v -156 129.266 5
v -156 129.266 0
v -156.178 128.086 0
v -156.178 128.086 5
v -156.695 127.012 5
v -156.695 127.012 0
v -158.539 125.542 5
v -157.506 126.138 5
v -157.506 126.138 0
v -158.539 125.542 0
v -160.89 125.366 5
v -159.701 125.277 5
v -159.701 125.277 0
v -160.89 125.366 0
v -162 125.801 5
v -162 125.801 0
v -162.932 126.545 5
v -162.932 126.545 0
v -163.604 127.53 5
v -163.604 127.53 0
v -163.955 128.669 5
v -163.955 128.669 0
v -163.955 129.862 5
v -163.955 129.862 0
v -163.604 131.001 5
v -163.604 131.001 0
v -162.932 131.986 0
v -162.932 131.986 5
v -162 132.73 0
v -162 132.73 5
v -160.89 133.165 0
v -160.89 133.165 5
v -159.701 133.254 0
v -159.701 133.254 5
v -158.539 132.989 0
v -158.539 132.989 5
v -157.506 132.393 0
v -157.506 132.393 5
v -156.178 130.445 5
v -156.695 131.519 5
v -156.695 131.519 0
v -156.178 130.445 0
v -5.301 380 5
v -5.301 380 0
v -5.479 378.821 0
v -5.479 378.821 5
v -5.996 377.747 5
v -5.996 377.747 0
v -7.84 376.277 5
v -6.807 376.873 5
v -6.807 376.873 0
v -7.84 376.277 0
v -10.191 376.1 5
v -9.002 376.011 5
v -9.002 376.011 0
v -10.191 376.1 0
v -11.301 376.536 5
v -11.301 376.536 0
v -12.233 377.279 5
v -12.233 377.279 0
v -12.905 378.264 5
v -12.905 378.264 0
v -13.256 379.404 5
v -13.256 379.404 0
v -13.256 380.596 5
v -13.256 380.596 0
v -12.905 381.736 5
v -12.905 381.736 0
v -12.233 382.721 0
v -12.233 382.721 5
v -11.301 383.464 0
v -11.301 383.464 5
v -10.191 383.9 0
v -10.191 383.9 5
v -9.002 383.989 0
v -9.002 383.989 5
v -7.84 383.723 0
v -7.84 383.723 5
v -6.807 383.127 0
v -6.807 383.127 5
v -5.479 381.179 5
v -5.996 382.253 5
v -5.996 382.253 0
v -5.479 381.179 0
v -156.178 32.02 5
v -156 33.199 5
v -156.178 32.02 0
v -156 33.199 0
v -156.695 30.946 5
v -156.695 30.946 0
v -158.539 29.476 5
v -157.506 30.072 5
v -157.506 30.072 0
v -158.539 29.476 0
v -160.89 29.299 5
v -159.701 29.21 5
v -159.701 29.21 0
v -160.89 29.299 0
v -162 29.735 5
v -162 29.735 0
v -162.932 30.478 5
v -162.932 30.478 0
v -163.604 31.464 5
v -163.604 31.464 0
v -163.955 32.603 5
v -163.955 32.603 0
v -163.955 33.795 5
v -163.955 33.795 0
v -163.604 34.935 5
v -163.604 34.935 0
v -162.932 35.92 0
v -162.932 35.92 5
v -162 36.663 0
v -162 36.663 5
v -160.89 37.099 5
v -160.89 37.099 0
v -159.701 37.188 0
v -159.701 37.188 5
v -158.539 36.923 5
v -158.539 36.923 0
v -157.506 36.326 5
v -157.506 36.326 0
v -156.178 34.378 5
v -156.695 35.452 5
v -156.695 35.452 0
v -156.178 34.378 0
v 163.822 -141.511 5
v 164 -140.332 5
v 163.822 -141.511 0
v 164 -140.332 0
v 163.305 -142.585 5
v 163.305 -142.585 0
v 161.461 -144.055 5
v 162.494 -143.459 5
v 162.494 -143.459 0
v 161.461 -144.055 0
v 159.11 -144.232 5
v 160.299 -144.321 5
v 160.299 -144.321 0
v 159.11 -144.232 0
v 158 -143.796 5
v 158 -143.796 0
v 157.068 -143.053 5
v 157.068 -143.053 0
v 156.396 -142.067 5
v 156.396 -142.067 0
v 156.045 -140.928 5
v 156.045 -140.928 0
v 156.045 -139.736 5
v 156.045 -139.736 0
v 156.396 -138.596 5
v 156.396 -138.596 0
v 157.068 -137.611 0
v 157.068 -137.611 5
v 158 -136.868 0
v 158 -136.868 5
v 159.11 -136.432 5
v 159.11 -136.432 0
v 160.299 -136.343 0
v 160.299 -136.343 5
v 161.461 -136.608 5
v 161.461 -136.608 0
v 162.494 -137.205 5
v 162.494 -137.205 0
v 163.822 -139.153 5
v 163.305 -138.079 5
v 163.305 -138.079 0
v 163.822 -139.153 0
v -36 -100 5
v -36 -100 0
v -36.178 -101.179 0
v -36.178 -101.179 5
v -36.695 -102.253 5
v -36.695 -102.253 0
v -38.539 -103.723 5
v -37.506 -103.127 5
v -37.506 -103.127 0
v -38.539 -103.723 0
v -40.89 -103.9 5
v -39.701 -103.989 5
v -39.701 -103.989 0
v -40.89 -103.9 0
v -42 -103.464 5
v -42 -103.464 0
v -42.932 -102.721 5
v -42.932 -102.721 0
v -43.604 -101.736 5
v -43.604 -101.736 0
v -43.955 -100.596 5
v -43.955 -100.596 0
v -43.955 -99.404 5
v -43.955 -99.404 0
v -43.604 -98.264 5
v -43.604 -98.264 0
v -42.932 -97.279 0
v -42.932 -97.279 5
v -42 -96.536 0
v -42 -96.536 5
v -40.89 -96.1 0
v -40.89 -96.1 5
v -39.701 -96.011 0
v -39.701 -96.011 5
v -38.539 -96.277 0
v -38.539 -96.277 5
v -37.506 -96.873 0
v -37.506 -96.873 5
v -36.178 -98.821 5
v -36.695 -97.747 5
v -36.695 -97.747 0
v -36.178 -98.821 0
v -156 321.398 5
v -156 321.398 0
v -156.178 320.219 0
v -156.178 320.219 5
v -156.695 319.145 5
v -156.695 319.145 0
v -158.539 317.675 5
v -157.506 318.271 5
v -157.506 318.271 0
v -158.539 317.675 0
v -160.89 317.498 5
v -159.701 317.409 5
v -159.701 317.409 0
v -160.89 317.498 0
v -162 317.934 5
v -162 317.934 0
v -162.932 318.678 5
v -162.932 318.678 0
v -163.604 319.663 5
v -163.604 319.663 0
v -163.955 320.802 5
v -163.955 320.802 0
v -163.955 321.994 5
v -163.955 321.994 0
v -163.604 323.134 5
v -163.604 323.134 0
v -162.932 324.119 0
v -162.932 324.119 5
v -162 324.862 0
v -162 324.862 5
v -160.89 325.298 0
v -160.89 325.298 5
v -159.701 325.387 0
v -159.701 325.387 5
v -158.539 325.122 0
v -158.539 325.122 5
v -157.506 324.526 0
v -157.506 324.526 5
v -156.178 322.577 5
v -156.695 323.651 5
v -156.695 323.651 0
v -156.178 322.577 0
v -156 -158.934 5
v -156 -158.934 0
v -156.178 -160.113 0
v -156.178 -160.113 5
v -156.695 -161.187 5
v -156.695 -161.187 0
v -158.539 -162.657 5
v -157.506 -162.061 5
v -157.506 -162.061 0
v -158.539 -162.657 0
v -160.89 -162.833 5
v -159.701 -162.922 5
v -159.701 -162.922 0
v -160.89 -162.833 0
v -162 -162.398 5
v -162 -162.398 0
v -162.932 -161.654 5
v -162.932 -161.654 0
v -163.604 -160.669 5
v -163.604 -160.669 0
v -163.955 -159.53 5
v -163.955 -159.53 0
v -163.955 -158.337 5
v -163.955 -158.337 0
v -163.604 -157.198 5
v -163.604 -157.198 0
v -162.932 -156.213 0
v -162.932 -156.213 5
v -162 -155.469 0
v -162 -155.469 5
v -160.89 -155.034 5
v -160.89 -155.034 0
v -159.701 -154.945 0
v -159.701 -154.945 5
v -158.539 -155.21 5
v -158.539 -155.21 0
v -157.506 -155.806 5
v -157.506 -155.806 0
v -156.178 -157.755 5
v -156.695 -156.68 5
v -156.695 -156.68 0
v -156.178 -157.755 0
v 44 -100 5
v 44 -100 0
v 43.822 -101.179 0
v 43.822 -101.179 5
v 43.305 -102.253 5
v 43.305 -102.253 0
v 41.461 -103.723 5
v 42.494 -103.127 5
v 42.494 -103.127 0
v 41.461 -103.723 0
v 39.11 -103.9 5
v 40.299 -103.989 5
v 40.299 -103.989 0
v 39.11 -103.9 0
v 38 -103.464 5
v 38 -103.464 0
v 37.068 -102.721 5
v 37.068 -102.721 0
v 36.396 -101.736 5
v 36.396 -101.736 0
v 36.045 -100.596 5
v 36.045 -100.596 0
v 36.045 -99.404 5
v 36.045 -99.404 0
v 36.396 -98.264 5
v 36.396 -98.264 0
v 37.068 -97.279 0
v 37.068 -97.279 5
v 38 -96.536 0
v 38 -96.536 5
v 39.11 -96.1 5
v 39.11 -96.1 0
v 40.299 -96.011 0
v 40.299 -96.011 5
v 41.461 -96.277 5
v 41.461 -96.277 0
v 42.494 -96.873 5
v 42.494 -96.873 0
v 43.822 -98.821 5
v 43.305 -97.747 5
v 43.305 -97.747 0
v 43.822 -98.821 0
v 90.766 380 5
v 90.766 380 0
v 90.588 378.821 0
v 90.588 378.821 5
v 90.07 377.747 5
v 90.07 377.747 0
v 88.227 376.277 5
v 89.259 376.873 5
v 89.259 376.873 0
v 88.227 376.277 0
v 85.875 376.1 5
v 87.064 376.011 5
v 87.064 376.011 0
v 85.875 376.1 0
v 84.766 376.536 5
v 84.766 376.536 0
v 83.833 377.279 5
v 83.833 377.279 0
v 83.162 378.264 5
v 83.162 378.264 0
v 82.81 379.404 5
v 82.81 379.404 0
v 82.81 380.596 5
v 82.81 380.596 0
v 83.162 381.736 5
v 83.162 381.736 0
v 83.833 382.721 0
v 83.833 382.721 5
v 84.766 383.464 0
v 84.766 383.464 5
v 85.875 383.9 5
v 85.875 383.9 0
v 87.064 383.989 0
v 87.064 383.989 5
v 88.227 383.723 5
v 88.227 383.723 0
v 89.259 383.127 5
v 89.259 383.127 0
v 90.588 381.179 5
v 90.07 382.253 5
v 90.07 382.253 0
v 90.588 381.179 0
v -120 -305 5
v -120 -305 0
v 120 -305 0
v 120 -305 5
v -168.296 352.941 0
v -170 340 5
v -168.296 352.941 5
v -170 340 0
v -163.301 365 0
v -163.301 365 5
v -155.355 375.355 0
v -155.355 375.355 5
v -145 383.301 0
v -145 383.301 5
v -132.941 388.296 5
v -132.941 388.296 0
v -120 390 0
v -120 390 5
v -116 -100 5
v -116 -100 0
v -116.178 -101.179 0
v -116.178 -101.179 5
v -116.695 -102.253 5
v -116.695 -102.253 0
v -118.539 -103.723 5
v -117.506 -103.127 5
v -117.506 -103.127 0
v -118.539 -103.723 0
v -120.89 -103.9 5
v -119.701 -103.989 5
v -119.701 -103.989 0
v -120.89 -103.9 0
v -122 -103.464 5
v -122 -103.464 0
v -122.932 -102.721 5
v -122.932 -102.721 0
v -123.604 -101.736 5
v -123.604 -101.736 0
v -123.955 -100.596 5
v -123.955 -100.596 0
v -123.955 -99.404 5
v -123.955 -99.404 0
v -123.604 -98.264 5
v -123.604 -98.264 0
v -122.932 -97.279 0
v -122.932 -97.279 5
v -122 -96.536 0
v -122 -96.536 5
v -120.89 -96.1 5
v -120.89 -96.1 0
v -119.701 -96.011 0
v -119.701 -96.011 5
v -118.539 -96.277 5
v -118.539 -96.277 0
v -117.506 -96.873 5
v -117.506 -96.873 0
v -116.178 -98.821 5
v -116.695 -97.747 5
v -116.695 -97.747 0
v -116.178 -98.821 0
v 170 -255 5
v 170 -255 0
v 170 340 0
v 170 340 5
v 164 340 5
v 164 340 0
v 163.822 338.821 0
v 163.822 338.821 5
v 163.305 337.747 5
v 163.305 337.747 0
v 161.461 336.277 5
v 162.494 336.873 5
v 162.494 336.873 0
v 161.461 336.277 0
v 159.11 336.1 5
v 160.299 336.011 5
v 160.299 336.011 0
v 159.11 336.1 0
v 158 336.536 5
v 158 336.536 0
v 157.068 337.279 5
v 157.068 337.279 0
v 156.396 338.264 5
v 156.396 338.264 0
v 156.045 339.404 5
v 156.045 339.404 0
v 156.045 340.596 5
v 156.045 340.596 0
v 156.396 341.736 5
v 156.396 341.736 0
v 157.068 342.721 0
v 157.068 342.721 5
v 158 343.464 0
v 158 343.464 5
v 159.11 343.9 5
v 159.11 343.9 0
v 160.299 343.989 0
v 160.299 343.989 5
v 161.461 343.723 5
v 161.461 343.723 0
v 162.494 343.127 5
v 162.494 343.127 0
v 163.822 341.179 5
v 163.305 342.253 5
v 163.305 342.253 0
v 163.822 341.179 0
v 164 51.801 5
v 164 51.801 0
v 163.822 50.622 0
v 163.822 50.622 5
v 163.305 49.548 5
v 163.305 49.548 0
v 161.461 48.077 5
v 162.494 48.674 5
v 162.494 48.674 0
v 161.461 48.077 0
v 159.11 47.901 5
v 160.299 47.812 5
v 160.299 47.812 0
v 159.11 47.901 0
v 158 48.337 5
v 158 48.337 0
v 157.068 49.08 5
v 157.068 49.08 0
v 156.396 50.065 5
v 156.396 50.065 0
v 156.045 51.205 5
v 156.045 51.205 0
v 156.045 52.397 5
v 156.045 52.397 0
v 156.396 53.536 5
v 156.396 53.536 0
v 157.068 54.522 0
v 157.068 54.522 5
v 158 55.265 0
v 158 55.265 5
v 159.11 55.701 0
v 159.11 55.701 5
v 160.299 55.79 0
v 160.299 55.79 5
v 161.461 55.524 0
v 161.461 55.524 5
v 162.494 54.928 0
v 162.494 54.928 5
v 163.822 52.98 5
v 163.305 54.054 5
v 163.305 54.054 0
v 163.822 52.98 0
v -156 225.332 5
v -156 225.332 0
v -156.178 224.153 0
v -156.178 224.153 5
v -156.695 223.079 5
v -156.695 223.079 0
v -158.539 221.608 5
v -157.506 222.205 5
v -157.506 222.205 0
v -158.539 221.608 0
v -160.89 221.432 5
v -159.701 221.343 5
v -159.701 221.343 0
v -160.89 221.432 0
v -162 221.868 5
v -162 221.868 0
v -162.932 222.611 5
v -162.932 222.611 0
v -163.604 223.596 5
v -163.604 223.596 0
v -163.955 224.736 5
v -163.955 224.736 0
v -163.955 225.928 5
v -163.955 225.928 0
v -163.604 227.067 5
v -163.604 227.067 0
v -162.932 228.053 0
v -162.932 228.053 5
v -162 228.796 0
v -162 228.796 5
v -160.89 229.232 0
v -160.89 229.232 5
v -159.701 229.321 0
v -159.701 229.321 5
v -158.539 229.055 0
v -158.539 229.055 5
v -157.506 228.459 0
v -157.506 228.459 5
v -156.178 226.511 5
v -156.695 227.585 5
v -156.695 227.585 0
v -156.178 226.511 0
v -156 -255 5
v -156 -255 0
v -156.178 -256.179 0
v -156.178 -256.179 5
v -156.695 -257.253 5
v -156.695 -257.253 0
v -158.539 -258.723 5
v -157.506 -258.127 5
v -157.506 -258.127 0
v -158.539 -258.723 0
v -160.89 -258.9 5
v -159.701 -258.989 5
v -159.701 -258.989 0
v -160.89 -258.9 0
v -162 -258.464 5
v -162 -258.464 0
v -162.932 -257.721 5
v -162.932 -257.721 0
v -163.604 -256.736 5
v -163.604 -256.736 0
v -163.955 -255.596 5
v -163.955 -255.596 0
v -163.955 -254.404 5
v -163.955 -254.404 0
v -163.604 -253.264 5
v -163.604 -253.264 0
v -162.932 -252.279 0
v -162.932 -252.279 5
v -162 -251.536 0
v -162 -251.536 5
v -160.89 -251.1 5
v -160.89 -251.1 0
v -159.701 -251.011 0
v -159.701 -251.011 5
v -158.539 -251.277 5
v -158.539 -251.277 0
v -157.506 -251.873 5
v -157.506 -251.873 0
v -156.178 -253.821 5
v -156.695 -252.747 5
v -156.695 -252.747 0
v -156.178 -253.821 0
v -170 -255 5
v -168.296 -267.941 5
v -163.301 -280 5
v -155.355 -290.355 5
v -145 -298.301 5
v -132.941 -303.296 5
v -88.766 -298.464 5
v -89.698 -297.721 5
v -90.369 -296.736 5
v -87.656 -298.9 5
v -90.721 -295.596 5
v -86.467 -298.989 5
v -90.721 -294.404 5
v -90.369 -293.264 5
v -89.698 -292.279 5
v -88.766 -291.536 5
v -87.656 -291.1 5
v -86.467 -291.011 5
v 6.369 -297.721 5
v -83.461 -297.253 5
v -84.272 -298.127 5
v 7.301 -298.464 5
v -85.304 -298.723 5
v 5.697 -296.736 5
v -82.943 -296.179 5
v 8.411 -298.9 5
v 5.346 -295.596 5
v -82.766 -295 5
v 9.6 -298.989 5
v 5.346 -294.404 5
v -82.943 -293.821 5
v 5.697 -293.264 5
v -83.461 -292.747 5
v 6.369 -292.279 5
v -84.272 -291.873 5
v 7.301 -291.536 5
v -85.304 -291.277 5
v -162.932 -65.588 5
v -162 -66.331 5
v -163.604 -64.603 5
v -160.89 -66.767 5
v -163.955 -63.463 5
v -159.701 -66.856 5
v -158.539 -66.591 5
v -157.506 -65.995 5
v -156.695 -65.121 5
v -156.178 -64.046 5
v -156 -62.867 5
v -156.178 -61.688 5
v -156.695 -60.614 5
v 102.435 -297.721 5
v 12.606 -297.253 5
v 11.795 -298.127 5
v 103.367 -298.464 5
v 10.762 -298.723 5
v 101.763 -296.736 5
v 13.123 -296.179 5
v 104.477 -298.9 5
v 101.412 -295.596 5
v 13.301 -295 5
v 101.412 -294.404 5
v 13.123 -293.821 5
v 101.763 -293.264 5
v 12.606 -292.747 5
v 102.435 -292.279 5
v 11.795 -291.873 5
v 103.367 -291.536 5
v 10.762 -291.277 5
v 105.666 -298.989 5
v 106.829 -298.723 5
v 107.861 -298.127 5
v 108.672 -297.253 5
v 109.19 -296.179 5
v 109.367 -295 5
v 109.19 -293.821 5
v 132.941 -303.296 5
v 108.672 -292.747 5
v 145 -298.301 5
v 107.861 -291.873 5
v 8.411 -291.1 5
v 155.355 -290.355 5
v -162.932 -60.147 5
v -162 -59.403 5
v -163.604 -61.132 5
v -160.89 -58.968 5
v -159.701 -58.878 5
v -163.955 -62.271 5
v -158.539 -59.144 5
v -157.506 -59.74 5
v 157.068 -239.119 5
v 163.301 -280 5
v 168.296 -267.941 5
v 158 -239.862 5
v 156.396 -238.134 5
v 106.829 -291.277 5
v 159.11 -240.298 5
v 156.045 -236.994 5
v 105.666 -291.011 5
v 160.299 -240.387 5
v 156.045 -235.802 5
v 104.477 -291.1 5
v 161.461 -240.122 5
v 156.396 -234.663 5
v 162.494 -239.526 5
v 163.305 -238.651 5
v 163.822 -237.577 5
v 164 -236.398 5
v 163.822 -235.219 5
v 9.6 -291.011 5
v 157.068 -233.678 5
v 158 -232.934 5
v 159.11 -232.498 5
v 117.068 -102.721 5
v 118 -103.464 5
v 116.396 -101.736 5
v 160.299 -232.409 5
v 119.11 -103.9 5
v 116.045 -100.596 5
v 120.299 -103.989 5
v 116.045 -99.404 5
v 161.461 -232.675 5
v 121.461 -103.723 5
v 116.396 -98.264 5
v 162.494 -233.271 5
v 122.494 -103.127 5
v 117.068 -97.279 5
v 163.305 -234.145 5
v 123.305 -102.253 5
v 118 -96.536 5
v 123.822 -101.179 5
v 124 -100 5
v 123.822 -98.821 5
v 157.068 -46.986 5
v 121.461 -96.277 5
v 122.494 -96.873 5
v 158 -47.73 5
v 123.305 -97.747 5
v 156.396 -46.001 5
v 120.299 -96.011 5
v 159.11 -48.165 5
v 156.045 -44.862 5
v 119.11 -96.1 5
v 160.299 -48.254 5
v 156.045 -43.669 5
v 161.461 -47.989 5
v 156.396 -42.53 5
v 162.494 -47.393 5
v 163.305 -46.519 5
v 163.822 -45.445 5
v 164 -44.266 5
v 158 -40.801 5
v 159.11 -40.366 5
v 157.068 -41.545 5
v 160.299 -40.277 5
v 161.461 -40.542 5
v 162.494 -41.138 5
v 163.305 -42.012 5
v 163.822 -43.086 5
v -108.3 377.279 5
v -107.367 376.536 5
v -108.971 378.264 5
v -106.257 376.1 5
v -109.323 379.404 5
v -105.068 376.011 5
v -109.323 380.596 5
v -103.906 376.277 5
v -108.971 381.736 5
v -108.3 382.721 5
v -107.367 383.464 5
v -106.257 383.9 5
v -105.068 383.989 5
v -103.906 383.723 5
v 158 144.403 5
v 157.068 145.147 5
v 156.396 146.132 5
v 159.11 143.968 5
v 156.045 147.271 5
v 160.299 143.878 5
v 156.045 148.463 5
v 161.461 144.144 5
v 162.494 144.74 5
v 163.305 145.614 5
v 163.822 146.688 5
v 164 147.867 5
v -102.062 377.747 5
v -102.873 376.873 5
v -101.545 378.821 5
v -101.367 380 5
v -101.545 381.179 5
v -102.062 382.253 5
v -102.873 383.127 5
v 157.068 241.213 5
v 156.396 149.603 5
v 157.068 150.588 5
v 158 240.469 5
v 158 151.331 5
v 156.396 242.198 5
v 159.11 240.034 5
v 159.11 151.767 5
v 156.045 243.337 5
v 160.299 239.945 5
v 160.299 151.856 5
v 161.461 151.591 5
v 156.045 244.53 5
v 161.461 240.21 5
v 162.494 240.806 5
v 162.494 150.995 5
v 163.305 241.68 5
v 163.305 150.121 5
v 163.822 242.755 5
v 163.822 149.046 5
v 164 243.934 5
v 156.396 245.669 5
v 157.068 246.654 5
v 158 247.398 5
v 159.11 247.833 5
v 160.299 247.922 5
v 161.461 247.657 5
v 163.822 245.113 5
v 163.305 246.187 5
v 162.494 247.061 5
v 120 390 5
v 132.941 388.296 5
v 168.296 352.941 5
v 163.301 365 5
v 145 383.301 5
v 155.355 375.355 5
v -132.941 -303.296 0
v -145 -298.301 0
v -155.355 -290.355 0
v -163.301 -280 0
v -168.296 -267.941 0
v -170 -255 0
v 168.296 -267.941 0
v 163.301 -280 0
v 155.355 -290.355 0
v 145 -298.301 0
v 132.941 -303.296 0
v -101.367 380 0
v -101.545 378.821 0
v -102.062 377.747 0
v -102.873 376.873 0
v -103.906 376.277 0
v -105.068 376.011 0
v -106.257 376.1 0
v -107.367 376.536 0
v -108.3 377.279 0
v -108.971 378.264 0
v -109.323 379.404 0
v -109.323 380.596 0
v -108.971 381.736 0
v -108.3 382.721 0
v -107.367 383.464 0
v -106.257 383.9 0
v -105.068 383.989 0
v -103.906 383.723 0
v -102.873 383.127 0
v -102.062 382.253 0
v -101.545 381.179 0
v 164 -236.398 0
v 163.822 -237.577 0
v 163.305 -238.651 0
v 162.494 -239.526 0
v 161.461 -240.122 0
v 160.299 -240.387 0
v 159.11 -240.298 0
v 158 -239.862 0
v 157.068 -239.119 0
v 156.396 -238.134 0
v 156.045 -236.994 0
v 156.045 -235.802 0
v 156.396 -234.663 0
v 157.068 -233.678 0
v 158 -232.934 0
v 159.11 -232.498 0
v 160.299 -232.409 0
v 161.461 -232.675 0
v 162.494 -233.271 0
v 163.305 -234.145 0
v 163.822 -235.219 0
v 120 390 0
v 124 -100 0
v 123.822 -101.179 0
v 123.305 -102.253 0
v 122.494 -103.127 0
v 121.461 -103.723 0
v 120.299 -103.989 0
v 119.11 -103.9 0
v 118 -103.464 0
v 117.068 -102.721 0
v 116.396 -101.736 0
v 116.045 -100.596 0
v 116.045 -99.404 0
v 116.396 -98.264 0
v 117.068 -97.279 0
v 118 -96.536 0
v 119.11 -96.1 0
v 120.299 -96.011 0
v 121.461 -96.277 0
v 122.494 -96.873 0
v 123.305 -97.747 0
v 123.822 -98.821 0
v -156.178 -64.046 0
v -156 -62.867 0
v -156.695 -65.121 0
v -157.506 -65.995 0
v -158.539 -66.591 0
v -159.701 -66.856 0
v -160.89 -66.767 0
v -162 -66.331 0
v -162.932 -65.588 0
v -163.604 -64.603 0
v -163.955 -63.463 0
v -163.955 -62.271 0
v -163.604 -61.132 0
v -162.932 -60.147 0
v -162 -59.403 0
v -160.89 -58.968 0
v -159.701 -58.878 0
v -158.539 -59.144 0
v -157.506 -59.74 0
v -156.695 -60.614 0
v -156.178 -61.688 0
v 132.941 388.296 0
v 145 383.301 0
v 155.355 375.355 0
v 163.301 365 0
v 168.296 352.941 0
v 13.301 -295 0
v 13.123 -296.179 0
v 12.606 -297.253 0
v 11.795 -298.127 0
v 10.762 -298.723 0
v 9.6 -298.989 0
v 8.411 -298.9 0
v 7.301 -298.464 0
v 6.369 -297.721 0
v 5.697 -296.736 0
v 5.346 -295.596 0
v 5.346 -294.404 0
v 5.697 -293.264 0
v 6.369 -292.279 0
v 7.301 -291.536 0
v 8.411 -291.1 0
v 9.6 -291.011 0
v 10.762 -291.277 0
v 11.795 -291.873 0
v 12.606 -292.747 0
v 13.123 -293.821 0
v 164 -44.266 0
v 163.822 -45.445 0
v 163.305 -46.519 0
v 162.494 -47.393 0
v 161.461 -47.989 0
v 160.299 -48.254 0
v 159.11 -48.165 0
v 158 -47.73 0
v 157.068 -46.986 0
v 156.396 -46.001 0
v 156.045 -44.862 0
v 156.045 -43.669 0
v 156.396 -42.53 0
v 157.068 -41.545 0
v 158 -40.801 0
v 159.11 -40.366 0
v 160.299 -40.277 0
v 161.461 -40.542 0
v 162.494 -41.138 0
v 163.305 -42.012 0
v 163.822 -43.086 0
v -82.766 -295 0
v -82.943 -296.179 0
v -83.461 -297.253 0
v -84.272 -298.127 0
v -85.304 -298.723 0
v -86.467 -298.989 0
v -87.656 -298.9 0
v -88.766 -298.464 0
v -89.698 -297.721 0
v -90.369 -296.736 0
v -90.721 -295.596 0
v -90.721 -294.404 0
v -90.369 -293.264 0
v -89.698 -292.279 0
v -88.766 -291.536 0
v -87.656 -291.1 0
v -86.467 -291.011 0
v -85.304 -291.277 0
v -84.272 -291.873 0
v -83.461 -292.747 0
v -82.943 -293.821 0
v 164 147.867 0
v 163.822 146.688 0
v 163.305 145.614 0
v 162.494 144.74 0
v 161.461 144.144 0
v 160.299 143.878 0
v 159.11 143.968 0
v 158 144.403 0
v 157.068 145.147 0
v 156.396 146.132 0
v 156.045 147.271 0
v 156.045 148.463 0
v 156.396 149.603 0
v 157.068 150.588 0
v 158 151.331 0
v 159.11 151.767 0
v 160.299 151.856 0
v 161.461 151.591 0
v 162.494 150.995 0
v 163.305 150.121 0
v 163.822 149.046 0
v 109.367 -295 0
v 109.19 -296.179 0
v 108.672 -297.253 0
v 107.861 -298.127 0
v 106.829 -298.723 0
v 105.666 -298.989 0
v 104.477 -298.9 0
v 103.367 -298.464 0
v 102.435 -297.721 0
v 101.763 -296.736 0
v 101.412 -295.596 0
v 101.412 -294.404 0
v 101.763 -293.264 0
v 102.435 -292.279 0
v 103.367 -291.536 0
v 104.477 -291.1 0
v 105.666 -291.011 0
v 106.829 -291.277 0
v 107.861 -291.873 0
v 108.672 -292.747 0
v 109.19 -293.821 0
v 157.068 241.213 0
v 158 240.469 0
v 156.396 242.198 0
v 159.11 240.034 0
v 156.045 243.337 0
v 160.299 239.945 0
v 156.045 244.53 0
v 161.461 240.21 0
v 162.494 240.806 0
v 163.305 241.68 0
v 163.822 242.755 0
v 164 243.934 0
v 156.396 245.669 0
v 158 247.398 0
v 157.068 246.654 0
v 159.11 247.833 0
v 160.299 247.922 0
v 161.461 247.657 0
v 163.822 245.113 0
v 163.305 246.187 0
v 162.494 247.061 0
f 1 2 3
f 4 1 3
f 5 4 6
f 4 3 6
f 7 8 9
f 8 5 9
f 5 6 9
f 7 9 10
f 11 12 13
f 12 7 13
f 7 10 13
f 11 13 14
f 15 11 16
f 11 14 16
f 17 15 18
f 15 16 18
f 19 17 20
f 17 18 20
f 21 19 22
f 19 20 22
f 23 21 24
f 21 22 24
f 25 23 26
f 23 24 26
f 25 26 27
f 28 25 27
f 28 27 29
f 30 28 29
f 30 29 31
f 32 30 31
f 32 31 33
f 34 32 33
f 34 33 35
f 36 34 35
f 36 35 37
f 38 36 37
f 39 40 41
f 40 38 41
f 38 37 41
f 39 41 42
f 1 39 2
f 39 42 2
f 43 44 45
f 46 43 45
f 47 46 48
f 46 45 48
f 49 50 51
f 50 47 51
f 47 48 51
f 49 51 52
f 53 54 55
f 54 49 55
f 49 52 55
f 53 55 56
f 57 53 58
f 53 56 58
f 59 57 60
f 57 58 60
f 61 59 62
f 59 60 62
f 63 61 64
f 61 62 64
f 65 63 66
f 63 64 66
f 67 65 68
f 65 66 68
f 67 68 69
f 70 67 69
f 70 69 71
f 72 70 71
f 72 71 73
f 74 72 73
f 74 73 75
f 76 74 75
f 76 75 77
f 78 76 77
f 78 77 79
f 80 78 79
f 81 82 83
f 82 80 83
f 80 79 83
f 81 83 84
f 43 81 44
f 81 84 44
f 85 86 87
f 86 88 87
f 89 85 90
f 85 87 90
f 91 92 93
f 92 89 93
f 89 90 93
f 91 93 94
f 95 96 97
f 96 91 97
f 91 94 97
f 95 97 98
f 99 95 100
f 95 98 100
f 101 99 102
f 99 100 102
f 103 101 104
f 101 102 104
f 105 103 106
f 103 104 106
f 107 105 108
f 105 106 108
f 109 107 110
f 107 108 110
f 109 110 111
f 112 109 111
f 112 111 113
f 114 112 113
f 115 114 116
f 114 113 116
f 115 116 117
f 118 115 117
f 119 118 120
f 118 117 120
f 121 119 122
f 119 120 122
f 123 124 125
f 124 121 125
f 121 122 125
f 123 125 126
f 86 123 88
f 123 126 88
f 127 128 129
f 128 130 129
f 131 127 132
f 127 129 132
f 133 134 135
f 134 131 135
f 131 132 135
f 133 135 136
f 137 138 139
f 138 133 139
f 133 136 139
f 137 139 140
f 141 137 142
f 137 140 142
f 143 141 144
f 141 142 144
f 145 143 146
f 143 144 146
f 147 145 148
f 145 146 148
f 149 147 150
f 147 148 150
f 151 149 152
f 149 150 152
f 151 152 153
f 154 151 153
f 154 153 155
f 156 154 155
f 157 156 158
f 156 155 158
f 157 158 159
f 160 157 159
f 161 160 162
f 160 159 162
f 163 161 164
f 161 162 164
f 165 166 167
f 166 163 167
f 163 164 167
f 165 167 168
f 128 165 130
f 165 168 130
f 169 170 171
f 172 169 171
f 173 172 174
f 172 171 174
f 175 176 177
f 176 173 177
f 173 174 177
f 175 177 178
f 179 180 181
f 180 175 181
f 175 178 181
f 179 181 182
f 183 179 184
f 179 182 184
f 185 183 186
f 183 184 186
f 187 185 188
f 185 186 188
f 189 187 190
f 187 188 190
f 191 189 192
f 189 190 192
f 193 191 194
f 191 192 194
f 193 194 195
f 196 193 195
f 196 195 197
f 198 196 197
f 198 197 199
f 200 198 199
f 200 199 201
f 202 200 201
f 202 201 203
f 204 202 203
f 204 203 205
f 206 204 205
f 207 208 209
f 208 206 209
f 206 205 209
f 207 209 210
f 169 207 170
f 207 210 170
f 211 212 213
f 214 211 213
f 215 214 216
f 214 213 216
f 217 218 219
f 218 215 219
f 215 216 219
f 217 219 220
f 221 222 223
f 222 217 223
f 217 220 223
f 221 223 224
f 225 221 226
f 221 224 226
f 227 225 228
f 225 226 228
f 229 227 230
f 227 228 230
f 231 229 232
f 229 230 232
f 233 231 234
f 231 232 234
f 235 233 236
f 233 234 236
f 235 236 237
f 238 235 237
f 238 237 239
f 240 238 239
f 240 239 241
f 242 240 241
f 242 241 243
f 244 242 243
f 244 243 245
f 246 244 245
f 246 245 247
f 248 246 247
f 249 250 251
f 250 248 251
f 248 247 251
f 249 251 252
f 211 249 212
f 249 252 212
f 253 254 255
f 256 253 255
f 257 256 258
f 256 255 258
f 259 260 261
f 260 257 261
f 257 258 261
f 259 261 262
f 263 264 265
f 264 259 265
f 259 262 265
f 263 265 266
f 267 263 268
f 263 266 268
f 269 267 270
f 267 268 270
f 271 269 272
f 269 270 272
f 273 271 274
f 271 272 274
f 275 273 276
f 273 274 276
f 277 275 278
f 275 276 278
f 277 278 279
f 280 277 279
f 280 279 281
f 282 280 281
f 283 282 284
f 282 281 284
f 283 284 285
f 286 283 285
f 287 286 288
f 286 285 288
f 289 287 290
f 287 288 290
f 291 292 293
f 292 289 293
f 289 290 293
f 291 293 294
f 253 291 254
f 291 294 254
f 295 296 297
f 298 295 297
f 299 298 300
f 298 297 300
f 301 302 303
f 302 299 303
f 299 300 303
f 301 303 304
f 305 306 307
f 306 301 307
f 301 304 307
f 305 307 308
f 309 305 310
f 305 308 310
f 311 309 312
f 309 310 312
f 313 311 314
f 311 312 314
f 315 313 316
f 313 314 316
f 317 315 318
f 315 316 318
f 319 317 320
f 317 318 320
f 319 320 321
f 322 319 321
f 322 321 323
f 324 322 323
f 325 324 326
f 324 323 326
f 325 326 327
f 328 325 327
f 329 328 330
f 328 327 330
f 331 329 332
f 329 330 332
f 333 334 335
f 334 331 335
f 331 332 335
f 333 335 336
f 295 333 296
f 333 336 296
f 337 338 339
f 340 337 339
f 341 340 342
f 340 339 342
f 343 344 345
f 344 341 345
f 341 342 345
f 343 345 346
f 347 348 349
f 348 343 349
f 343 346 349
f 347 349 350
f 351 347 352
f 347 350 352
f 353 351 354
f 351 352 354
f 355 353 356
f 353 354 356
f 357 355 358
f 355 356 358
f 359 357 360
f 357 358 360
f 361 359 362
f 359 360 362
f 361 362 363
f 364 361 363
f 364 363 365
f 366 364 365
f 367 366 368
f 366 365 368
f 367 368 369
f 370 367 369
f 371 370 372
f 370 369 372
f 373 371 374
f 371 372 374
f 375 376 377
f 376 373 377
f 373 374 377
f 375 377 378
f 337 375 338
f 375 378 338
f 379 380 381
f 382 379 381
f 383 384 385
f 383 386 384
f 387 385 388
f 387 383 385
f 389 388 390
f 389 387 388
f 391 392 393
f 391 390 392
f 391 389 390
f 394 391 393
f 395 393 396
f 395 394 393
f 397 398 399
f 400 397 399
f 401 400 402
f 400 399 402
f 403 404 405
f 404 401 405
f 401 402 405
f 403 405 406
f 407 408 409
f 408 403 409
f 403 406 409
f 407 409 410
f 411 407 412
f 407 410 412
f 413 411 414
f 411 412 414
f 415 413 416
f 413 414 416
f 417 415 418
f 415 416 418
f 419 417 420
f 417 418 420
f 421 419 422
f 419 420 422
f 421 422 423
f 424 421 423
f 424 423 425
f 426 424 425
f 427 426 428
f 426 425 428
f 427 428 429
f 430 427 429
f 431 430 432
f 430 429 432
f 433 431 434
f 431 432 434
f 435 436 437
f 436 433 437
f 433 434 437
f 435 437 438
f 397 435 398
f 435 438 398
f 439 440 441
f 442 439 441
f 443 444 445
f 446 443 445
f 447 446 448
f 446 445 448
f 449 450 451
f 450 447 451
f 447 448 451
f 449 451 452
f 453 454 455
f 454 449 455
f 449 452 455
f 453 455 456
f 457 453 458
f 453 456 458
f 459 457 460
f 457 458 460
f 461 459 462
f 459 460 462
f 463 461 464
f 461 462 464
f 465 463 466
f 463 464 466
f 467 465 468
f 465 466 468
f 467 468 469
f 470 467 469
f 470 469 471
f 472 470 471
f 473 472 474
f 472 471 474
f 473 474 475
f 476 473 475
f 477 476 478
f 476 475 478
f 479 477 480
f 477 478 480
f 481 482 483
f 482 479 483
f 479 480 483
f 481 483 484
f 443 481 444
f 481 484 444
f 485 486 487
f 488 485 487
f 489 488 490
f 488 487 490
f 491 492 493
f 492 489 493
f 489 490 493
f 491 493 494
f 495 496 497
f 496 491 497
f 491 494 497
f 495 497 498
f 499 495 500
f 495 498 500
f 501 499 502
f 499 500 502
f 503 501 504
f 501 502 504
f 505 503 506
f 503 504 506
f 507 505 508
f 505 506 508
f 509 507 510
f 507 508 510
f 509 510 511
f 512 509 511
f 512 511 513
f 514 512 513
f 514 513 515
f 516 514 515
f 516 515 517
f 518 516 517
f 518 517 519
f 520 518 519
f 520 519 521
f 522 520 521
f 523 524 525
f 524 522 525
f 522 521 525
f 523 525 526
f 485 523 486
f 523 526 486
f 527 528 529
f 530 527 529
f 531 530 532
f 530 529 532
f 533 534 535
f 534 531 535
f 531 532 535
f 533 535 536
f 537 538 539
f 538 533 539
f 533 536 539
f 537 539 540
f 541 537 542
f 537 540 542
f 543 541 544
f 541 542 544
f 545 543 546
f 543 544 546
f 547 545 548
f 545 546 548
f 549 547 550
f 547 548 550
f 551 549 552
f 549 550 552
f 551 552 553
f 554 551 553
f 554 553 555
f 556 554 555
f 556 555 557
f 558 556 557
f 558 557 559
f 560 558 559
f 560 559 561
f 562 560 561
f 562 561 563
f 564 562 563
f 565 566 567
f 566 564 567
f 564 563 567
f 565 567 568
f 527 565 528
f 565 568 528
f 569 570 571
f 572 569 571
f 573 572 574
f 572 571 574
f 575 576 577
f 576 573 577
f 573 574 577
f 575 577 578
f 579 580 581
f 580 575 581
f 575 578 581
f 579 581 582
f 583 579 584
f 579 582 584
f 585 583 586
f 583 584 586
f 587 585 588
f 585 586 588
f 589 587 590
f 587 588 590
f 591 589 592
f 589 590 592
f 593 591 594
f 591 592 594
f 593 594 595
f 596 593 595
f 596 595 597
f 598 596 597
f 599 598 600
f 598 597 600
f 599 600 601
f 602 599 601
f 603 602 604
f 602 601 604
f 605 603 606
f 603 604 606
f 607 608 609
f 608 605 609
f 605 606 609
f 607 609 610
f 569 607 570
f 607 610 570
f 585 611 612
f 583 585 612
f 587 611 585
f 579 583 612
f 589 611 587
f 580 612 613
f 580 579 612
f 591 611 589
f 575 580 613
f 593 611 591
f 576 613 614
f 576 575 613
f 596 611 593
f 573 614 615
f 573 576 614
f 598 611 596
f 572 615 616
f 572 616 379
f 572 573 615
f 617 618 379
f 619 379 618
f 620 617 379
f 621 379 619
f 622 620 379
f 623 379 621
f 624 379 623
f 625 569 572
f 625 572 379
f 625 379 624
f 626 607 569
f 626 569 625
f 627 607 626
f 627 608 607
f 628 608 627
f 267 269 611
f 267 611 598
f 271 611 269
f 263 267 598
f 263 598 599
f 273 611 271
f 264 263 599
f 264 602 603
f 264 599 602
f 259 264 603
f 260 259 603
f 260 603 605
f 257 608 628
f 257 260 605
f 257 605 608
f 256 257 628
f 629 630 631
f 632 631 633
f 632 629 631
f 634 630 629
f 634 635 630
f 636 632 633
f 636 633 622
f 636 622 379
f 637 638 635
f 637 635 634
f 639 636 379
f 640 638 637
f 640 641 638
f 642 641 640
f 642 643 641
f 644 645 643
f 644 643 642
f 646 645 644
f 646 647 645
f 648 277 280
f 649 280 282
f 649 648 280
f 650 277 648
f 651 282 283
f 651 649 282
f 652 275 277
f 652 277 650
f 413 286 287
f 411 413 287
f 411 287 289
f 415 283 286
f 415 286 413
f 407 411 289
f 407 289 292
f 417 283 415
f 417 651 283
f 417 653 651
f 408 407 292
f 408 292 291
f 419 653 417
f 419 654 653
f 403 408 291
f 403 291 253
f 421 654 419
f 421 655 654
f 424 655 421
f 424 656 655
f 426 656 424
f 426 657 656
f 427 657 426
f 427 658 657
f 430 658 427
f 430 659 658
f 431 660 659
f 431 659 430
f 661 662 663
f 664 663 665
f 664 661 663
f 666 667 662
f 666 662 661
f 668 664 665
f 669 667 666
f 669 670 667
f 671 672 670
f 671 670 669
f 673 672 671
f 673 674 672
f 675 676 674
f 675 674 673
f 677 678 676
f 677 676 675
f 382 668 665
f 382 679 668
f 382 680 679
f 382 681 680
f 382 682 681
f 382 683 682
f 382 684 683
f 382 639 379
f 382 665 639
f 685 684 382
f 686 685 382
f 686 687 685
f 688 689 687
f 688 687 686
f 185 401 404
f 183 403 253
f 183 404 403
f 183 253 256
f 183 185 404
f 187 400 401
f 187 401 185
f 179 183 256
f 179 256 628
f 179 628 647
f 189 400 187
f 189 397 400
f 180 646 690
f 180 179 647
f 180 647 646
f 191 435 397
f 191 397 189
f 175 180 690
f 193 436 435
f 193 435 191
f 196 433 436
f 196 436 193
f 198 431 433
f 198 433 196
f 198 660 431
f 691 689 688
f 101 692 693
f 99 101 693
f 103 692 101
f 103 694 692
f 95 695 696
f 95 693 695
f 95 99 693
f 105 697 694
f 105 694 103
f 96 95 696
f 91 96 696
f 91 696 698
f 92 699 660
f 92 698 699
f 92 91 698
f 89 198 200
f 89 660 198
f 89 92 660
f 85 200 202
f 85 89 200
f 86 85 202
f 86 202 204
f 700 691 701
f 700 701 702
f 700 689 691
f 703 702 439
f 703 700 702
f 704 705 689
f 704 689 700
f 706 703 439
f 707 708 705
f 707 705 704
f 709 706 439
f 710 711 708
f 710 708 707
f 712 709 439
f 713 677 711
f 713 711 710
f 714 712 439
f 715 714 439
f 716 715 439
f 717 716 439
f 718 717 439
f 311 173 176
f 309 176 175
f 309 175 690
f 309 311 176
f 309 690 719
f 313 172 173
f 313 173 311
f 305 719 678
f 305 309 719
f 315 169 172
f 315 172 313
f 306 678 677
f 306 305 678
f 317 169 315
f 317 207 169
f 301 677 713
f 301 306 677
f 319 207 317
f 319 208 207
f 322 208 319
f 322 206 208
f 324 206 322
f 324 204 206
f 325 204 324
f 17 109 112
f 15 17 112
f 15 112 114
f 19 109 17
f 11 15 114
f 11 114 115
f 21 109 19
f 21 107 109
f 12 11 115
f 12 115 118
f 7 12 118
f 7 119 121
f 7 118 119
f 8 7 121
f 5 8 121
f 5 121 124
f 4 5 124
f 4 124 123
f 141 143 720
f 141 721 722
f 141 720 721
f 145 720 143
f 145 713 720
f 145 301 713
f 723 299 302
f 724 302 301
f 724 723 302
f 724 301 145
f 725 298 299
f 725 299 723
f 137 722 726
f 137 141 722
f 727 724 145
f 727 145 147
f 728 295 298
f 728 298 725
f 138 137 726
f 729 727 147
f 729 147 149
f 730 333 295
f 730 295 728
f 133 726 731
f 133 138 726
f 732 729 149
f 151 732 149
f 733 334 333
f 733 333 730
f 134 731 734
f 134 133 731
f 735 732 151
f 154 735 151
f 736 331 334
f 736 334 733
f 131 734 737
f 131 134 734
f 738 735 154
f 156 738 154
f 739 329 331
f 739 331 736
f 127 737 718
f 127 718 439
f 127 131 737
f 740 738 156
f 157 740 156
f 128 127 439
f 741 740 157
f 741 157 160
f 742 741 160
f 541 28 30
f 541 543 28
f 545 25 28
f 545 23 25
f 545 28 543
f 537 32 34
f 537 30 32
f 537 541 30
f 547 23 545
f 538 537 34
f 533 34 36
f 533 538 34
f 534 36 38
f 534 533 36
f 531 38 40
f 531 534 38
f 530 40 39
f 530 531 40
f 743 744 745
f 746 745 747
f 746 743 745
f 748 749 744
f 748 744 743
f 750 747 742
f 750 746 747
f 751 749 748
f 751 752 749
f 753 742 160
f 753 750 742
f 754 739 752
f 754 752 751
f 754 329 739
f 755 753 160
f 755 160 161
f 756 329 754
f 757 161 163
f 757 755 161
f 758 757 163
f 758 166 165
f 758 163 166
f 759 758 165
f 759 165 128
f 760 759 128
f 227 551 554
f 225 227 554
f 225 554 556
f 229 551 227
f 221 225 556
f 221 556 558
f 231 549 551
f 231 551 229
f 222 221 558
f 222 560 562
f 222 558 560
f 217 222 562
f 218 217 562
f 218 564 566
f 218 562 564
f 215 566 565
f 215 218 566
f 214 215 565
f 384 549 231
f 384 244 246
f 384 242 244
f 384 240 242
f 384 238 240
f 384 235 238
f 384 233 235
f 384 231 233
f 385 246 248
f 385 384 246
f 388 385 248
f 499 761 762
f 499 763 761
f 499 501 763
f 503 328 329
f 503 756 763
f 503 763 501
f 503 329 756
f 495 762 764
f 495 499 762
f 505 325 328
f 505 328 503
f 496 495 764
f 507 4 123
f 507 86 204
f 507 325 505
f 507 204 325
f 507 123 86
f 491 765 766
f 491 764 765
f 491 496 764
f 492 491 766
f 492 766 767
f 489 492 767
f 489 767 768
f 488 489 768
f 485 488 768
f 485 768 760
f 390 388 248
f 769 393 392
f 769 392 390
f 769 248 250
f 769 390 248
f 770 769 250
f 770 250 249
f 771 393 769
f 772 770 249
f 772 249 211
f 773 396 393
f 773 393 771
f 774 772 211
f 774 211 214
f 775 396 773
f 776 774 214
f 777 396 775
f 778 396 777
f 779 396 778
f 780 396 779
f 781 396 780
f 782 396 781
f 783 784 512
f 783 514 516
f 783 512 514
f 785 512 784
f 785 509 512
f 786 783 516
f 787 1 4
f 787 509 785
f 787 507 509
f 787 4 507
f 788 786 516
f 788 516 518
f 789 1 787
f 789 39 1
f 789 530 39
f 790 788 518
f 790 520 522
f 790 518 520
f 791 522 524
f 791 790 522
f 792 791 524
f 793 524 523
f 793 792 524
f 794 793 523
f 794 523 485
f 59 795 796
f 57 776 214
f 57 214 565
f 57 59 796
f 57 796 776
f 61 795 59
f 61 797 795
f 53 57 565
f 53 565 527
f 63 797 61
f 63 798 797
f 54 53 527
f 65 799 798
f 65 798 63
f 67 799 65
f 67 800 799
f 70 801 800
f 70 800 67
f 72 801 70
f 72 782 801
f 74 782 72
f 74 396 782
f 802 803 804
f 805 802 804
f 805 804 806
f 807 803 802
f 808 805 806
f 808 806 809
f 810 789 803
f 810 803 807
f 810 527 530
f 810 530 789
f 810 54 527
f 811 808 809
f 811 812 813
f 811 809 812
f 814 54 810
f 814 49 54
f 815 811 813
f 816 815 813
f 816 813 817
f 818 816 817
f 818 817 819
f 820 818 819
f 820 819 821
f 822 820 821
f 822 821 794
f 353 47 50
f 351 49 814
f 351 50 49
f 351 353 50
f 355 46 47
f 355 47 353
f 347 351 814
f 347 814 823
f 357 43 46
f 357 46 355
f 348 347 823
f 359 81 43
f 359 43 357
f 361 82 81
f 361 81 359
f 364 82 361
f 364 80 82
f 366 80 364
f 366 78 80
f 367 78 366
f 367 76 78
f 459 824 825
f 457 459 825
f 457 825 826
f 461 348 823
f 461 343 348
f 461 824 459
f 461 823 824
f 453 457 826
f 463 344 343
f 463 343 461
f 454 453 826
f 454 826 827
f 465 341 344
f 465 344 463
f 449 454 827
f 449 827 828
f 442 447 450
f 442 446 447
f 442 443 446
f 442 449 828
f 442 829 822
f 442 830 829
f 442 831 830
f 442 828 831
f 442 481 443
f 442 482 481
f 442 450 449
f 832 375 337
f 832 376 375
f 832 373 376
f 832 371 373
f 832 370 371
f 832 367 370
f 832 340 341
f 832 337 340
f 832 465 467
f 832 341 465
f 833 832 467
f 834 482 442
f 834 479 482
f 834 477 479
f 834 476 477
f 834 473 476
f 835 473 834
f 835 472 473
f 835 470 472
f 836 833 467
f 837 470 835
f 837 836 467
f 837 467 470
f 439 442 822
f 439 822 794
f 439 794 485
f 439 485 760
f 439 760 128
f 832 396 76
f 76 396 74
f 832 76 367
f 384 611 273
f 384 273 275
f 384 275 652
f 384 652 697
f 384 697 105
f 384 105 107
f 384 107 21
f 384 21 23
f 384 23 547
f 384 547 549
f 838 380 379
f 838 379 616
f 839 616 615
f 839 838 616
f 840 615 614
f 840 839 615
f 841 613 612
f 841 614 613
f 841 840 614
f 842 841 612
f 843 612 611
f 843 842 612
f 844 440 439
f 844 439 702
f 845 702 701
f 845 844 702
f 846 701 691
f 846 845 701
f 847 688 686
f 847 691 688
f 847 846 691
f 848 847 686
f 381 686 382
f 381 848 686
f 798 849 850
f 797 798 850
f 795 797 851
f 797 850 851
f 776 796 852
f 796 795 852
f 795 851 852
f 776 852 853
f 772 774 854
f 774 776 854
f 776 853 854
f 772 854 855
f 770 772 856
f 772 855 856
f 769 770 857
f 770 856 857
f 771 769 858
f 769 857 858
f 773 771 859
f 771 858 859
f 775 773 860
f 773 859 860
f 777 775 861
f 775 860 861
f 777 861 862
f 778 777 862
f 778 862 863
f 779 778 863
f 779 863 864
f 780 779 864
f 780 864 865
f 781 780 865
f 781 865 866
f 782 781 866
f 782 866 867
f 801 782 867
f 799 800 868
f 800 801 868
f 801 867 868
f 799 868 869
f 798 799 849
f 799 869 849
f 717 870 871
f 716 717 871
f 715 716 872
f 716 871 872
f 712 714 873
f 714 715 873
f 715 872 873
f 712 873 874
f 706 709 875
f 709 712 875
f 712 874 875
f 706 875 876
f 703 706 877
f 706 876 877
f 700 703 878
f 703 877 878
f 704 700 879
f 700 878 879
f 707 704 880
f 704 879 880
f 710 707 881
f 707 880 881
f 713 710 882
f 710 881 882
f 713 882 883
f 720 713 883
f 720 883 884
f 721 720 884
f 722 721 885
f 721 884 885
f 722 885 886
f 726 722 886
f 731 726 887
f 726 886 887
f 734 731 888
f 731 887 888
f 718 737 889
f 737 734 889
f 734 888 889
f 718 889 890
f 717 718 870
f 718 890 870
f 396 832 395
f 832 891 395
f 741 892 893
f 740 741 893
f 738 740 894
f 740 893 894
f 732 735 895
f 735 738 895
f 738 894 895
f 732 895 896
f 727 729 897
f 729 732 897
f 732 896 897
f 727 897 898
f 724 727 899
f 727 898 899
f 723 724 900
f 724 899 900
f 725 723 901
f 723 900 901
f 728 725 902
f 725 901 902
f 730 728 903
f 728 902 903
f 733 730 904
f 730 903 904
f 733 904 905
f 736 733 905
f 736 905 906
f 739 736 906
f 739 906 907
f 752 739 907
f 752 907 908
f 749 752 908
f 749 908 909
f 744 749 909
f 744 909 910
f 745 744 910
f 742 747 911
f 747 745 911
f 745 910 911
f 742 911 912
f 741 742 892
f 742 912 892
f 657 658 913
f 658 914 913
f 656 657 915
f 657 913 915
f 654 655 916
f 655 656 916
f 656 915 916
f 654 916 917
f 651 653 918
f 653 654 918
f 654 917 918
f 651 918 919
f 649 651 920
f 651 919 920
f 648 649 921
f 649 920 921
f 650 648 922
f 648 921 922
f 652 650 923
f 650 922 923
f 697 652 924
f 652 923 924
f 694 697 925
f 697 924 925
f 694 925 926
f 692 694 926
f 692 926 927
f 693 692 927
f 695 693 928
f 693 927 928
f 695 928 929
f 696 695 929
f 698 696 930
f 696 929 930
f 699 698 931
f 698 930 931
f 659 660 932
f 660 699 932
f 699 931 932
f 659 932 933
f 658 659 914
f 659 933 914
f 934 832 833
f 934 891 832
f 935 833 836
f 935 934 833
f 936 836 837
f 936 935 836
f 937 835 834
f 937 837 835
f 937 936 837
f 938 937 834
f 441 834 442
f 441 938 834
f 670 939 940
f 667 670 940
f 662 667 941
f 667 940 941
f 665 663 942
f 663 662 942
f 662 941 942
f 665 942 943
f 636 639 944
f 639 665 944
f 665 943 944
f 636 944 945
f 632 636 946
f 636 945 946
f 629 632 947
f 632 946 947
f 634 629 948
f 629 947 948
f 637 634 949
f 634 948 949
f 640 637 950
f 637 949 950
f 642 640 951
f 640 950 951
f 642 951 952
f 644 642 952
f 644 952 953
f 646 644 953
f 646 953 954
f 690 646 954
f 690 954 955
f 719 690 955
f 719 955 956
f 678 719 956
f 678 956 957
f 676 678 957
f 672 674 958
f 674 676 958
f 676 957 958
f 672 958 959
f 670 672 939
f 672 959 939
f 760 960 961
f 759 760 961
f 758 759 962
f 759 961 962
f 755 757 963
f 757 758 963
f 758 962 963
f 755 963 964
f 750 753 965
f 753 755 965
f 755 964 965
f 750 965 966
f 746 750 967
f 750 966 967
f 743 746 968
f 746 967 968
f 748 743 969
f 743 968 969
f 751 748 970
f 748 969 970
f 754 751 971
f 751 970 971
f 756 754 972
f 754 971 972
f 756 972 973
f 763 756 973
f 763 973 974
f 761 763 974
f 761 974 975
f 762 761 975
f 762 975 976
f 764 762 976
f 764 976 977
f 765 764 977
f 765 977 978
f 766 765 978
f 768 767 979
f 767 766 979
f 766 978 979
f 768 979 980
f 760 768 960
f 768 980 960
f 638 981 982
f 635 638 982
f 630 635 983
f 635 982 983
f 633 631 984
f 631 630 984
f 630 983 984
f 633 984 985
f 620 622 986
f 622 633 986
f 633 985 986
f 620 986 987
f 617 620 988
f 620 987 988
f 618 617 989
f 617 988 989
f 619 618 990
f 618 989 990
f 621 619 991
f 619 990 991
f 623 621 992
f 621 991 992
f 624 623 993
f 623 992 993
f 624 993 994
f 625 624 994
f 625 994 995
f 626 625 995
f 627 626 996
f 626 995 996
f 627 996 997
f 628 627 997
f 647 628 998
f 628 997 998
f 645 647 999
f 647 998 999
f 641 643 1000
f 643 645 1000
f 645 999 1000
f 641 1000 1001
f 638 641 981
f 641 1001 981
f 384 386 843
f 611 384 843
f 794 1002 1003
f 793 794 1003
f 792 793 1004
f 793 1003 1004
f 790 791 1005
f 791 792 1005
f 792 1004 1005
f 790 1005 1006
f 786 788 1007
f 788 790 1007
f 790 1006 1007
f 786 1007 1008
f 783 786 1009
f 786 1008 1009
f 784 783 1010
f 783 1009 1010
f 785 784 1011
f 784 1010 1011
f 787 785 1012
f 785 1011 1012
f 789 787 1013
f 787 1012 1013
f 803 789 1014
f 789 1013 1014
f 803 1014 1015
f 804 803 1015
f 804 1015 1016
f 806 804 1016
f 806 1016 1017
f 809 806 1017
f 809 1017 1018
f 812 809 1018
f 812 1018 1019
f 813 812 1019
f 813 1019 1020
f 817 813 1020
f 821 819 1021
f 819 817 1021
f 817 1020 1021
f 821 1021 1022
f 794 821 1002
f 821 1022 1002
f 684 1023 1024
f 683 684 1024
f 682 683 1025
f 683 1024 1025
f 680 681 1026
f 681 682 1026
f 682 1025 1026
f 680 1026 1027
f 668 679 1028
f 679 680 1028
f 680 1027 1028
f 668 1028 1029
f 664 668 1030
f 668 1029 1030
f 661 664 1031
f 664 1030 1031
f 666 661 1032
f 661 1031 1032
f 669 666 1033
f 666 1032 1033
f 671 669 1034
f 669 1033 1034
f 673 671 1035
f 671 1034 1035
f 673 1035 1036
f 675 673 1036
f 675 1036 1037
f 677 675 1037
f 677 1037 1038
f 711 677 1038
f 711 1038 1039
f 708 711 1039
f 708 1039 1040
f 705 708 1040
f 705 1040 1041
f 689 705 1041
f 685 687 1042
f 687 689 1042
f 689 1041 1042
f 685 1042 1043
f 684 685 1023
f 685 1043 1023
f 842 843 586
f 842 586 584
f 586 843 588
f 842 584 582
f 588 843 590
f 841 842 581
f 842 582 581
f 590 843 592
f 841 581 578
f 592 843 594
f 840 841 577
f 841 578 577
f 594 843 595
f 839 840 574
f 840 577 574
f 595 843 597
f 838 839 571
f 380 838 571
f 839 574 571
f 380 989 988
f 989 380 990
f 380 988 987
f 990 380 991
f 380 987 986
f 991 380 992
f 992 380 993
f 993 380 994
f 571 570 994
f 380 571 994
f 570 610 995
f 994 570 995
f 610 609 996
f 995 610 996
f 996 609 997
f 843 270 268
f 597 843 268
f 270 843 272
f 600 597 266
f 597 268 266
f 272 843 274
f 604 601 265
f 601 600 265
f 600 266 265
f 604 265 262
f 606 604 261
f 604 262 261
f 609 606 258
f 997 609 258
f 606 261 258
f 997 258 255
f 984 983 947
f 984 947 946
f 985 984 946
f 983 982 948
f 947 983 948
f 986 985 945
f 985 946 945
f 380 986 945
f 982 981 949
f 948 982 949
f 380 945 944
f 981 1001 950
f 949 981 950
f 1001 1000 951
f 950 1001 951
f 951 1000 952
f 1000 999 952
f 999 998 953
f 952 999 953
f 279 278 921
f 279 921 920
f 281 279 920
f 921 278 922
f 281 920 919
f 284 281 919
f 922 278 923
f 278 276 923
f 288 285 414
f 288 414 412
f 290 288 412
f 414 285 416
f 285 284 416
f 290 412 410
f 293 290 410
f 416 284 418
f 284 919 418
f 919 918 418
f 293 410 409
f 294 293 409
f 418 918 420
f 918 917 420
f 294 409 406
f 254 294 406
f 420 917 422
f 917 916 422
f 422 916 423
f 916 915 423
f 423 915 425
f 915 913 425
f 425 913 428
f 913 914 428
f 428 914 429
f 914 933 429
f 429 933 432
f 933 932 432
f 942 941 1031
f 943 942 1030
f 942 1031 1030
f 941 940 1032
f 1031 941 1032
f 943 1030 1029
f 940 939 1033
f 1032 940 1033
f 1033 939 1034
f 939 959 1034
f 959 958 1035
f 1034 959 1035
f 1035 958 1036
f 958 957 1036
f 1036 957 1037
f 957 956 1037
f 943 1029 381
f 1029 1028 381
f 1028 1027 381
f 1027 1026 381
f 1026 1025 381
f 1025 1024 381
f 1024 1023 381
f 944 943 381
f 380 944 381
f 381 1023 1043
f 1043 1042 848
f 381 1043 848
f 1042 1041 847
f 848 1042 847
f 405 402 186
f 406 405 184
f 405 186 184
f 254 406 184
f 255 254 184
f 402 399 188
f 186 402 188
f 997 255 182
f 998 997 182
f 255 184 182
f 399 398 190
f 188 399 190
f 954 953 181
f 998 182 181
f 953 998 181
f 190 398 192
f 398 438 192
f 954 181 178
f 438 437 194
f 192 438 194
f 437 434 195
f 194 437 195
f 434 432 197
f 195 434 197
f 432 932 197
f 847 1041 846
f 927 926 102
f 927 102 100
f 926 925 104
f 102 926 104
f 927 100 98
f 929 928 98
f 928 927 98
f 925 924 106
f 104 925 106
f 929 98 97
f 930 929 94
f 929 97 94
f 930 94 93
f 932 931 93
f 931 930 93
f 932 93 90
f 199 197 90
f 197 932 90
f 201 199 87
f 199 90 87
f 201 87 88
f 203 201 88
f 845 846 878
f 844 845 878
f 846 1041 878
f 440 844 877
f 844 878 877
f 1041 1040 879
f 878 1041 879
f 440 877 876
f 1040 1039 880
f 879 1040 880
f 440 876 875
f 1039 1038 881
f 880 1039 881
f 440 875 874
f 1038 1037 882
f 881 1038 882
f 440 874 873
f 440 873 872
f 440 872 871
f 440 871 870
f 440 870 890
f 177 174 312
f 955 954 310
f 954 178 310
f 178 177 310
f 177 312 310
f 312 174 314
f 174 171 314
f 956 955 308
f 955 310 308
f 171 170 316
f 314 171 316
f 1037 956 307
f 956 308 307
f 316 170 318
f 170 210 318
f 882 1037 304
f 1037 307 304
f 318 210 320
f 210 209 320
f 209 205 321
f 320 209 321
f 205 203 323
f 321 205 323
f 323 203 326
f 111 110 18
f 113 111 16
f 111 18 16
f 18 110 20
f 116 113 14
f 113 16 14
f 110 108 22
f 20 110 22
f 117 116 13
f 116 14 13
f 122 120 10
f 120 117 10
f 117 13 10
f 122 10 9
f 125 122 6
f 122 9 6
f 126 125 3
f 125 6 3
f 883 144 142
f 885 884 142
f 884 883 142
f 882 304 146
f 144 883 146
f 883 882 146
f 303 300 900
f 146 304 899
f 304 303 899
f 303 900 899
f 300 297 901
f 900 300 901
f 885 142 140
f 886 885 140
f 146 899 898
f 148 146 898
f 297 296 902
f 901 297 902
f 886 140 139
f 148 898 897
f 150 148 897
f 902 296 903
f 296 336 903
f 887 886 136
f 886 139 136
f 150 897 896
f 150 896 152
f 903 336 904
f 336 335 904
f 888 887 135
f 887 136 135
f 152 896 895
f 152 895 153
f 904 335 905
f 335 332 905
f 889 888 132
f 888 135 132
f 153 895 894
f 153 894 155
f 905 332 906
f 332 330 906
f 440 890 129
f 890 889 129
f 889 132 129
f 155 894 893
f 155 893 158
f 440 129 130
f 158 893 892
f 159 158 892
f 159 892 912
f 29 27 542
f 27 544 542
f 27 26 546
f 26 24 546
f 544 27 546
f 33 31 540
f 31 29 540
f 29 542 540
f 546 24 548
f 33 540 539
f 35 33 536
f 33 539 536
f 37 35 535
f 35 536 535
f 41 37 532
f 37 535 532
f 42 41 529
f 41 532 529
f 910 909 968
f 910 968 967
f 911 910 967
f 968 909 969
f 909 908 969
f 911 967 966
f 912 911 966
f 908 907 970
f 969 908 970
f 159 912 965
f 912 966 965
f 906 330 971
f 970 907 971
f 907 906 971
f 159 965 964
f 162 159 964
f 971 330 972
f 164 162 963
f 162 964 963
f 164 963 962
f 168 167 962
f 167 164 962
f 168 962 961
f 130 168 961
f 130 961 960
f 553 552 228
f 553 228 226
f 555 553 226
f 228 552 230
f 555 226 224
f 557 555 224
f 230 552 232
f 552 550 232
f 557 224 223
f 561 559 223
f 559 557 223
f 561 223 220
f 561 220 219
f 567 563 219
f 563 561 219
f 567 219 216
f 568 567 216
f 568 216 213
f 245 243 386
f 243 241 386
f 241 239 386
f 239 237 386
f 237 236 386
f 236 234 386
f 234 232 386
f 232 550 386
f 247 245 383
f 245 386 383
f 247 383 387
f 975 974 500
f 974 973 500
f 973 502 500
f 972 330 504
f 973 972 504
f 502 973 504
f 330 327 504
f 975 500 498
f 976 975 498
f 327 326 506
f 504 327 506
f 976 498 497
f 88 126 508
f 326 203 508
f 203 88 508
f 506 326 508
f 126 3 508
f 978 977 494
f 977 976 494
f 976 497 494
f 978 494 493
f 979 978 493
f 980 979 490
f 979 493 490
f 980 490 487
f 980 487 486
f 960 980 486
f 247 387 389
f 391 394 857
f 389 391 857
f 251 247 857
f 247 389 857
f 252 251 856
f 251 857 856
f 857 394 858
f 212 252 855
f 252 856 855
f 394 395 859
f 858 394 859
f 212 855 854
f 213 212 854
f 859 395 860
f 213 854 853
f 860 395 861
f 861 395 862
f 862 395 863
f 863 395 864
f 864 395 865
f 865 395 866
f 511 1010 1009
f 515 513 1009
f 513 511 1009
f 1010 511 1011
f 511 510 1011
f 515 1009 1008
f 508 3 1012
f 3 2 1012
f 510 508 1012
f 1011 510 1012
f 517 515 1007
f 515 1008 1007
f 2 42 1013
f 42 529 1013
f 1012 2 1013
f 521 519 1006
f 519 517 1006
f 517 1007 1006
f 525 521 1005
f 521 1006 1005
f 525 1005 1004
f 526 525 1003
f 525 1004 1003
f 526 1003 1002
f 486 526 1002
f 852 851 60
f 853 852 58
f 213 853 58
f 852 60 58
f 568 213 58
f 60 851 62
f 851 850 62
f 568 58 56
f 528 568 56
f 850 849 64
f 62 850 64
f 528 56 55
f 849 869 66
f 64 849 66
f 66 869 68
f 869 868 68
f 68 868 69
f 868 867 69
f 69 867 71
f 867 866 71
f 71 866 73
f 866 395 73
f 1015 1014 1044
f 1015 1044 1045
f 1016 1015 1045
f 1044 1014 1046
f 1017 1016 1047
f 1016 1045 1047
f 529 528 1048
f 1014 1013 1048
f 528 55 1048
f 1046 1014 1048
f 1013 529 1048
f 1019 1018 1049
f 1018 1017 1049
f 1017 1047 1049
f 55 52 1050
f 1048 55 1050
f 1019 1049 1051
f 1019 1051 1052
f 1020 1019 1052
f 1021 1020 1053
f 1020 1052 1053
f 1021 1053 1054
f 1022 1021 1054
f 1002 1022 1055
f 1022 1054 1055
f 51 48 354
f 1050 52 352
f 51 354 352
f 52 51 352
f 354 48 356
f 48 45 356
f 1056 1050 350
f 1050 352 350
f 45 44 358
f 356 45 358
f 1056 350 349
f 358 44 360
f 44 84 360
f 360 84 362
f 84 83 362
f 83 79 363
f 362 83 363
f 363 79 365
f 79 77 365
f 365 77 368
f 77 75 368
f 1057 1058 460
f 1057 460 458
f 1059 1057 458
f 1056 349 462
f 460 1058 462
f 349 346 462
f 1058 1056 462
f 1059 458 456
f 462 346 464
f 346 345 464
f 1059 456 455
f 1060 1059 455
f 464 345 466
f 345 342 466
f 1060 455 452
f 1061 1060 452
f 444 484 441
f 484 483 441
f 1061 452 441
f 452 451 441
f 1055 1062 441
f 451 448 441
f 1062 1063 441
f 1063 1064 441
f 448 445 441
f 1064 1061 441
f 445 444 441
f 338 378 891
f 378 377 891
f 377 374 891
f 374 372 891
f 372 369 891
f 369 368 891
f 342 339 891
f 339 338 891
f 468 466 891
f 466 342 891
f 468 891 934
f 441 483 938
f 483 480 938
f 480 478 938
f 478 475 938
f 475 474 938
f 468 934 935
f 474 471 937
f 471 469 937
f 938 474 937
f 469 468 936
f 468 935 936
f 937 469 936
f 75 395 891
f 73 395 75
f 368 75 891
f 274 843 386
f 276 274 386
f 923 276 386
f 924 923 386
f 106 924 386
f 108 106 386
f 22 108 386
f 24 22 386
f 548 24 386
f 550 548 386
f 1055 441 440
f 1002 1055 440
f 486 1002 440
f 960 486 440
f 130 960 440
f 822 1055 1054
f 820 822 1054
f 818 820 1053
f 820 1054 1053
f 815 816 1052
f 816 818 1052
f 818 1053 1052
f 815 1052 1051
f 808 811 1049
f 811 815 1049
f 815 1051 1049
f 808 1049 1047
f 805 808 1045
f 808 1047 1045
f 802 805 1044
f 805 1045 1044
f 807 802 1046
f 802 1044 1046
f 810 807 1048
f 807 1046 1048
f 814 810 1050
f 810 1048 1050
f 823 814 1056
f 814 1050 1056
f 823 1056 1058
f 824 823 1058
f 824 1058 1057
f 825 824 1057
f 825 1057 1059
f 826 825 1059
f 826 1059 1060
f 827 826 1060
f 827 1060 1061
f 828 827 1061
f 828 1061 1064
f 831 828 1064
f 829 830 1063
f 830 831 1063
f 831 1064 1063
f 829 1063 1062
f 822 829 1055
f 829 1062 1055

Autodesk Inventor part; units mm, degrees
ref_plane "YZ Plane" through (0, 0, 0) normal (1, 0, 0) x (0, 1, 0)
ref_plane "XZ Plane" through (0, 0, 0) normal (0, 1, 0) x (-1, 0, 0)
ref_plane "XY Plane" through (0, 0, 0) normal (0, 0, 1) x (1, 0, 0)
ref_plane "РабПлоскость1" through (0, 0, 0) normal (0, 0, 1) x (1, 0, 0)
sketch "Эскиз1" plane through (0, 0, 0) normal (0, 0, 1) x (1, 0, 0)
  circle A0 centre (120, -100) radius 4
  circle A1 centre (40, -100) radius 4
  circle A2 centre (-40, -100) radius 4
  circle A3 centre (-120, -100) radius 4
  circle A4 centre (-86.7655, -295) radius 4
  circle A5 centre (9.3009, -295) radius 4
  circle A6 centre (105.3673, -295) radius 4
  circle A7 centre (160, -236.3982) radius 4
  circle A8 centre (160, -140.3319) radius 4
  circle A9 centre (160, -44.2655) radius 4
  circle A10 centre (160, 51.8009) radius 4
  circle A11 centre (160, 147.8673) radius 4
  circle A12 centre (160, 243.9336) radius 4
  circle A13 centre (160, 340) radius 4
  circle A14 centre (86.7655, 380) radius 4
  circle A15 centre (-9.3009, 380) radius 4
  circle A16 centre (-105.3673, 380) radius 4
  circle A17 centre (-160, 321.3982) radius 4
  circle A18 centre (-160, 225.3319) radius 4
  circle A19 centre (-160, 129.2655) radius 4
  circle A20 centre (-160, 33.1991) radius 4
  circle A21 centre (-160, -62.8673) radius 4
  circle A22 centre (-160, -158.9336) radius 4
  circle A23 centre (-160, -255) radius 4
  line L0 (170, -255) -> (170, 340)
  arc A24 (170, 340) -> (120, 390) centre (120, 340) ccw
  line L1 (120, 390) -> (-120, 390)
  arc A25 (-120, 390) -> (-170, 340) centre (-120, 340) ccw
  line L2 (-170, 340) -> (-170, -255)
  arc A26 (-170, -255) -> (-120, -305) centre (-120, -255) ccw
  line L3 (-120, -305) -> (120, -305)
  arc A27 (120, -305) -> (170, -255) centre (120, -255) ccw
  line L4 (-120, -120) -> (120, -120)
  arc A28 (150, -150) -> (120, -120) centre (120, -150) ccw
  line L5 (150, -150) -> (150, -255)
  arc A29 (120, -285) -> (150, -255) centre (120, -255) ccw
  line L6 (120, -285) -> (-120, -285)
  arc A30 (-150, -255) -> (-120, -285) centre (-120, -255) ccw
  line L7 (-150, -255) -> (-150, -150)
  arc A31 (-120, -120) -> (-150, -150) centre (-120, -150) ccw
  line L8 (150, 340) -> (150, -50)
  arc A32 (120, -80) -> (150, -50) centre (120, -50) ccw
  line L9 (120, -80) -> (-120, -80)
  arc A33 (-150, -50) -> (-120, -80) centre (-120, -50) ccw
  line L10 (-150, -50) -> (-150, 340)
  arc A34 (-120, 370) -> (-150, 340) centre (-120, 340) ccw
  line L11 (-120, 370) -> (120, 370)
  arc A35 (150, 340) -> (120, 370) centre (120, 340) ccw
  point P0 (0, 0)
extrude "Выдавливание1" add sketch "Эскиз1" along normal blind 5 contours A27 L3 A26 L2 A25 L1 A24 L0 | L4 A28 L5 A29 L6 A30 L7 A31 | L8 A32 L9 A33 L10 A34 L11 A35
properties part number "Крышка фонаря 2" material "Чугун, серый"
